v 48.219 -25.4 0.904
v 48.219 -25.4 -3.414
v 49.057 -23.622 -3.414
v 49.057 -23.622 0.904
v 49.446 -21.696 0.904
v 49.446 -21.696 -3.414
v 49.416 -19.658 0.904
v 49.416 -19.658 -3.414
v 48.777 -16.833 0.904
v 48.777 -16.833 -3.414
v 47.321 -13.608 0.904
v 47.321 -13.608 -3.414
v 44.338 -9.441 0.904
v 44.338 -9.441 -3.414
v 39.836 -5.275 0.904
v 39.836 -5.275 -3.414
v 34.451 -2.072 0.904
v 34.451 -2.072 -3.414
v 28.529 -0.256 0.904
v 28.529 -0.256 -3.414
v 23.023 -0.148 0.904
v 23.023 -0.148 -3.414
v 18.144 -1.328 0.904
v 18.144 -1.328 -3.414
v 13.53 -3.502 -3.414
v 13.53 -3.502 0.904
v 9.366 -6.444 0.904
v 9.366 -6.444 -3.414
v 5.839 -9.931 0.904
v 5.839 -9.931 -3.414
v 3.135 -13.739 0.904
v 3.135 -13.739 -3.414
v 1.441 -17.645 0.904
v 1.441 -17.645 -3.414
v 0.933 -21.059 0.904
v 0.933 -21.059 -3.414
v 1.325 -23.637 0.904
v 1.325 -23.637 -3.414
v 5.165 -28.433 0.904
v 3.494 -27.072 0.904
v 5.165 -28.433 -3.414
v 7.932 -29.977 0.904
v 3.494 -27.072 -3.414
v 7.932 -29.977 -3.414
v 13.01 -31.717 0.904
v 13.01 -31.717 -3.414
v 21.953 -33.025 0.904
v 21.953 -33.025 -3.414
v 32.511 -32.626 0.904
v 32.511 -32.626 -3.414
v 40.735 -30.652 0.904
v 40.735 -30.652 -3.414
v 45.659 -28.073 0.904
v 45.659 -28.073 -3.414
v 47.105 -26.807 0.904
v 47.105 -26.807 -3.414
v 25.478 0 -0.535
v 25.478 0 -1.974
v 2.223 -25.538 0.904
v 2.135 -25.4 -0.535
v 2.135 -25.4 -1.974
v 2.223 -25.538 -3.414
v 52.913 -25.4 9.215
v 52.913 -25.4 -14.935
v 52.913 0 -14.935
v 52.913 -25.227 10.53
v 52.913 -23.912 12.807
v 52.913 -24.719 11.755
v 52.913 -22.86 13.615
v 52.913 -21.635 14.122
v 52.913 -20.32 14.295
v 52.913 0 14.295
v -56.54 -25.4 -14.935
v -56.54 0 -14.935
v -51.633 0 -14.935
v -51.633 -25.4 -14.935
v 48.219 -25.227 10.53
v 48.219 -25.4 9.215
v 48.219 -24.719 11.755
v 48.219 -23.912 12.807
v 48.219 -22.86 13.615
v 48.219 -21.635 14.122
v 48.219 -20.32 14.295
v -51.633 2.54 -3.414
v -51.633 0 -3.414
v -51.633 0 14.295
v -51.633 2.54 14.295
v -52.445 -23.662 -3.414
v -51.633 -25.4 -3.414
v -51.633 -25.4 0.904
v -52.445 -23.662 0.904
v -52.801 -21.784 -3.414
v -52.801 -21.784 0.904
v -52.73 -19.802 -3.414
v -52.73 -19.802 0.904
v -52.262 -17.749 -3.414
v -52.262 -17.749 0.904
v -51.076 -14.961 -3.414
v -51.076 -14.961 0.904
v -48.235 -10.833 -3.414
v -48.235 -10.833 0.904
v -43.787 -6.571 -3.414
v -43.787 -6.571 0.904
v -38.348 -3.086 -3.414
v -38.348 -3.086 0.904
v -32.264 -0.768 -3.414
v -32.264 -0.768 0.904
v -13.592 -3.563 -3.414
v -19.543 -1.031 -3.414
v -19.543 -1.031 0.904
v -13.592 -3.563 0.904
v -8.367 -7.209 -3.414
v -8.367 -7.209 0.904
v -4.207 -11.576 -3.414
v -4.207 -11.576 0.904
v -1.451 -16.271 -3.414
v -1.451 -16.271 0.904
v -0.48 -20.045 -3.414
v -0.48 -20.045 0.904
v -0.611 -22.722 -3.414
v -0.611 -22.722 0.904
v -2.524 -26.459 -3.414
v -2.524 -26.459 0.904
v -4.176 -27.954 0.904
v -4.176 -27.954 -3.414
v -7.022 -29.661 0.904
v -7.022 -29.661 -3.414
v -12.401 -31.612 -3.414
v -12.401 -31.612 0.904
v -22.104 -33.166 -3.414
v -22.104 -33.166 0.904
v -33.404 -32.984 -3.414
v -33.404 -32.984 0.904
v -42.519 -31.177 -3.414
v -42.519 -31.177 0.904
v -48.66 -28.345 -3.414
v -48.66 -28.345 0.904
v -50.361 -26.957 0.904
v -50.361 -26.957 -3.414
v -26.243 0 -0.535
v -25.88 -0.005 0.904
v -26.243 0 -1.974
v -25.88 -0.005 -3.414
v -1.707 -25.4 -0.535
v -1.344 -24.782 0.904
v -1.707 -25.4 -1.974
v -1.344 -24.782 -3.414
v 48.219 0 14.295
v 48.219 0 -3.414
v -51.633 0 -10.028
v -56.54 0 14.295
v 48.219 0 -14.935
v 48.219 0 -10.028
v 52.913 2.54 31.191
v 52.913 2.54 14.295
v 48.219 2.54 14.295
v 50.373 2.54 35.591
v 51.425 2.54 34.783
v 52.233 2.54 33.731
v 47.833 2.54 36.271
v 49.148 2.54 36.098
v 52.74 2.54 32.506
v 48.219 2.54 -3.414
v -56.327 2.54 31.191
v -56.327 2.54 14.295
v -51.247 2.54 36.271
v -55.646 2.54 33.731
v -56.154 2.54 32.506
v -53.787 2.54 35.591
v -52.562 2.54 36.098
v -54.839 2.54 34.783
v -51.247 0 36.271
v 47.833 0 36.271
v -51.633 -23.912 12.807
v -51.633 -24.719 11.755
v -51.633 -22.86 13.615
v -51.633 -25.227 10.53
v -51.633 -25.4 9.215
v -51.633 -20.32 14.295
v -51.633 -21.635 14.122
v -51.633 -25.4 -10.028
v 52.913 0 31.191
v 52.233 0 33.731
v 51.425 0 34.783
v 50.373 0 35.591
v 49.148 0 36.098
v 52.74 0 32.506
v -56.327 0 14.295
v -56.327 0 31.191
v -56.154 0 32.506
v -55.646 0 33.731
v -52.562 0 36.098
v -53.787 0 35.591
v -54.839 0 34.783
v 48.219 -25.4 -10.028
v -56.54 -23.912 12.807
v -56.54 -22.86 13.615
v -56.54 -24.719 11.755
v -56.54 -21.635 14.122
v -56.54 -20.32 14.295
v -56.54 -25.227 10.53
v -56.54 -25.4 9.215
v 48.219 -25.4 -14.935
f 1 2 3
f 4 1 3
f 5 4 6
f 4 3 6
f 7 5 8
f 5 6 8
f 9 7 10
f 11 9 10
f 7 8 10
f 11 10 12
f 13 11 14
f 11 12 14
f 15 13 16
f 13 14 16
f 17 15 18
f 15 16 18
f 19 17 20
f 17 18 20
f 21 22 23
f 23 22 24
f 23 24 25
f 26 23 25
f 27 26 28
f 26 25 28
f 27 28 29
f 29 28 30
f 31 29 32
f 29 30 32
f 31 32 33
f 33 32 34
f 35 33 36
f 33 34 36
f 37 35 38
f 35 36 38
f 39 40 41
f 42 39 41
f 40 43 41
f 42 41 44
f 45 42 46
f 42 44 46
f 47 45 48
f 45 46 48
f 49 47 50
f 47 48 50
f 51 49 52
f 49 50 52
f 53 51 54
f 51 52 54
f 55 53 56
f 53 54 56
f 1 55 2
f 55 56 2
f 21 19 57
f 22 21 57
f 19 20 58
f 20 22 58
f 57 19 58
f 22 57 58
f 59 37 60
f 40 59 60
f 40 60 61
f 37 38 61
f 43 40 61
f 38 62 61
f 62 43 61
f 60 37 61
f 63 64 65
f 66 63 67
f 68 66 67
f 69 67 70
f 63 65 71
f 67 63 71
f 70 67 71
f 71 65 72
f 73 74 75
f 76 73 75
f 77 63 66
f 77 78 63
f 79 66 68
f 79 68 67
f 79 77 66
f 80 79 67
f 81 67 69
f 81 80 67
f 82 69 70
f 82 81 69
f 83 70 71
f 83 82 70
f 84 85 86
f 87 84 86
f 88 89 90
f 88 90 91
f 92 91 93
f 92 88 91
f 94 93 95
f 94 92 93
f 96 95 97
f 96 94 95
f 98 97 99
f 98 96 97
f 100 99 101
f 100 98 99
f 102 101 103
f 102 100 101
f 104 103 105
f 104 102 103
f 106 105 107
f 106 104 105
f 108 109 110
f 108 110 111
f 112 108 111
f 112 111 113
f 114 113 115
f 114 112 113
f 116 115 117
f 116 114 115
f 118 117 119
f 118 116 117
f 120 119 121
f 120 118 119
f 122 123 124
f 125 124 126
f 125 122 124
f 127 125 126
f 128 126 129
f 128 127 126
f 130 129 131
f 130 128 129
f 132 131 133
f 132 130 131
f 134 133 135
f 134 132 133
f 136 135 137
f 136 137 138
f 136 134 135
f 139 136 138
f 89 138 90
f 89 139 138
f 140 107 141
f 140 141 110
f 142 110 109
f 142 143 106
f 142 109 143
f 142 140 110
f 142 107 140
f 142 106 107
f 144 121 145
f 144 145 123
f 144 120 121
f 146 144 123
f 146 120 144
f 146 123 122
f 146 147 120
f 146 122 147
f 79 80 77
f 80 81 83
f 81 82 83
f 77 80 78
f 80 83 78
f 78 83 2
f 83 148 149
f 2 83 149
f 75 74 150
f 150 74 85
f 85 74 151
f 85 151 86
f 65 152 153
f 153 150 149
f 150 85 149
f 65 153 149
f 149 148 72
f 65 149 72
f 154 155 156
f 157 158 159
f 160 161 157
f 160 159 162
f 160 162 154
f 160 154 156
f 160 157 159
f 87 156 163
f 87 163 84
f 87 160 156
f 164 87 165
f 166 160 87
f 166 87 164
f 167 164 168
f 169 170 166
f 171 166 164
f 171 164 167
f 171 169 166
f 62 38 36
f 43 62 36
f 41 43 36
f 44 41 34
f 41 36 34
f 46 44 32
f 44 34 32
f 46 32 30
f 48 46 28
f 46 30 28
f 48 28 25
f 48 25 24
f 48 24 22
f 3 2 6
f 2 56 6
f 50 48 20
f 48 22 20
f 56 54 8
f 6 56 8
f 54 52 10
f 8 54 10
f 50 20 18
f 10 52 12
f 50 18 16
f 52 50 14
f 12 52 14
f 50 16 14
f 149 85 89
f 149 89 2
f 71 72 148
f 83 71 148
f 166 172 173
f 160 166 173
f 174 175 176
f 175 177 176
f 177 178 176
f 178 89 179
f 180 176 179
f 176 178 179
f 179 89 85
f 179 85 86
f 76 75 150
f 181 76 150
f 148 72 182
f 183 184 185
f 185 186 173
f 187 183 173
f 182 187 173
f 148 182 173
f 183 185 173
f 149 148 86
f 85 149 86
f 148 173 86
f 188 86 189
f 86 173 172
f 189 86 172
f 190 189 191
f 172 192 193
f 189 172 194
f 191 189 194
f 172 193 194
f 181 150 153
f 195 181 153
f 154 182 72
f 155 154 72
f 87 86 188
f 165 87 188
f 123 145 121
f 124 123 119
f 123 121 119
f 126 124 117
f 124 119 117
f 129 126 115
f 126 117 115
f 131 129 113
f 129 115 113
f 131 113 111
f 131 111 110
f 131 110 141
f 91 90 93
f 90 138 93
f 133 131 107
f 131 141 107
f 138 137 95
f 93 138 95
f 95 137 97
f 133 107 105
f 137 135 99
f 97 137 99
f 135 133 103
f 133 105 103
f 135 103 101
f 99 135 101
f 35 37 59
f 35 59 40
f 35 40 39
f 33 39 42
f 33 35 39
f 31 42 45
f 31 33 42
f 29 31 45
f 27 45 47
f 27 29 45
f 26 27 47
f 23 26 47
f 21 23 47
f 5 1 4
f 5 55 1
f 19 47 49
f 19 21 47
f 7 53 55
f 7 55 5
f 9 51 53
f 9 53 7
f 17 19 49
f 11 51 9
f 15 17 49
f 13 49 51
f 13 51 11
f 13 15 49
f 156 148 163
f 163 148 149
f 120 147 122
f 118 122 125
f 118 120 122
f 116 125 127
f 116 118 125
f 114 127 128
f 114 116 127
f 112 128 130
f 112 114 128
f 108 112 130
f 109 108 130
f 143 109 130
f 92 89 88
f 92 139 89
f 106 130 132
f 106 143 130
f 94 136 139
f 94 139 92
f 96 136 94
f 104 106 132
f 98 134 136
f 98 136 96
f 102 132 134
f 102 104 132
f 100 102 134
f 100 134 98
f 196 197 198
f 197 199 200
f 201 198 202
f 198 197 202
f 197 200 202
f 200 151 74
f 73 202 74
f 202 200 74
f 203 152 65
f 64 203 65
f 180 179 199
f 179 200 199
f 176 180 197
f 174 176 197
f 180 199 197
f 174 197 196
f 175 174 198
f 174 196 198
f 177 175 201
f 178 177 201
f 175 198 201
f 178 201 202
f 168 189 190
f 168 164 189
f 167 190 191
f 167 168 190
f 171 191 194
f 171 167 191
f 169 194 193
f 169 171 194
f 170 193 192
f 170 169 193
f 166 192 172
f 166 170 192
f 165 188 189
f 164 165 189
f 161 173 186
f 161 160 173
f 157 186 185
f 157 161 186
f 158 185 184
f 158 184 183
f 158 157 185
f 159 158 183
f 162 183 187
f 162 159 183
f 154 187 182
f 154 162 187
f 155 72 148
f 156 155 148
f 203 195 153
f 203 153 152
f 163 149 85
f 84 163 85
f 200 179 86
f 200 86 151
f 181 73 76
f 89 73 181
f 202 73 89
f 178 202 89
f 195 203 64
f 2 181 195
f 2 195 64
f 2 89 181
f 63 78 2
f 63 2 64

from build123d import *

# Parameters (mm, degrees)
F0_W      = 99.852476269
F0_H      = 6.614160724
F2_DEPTH  = 25.4
F5_DEPTH  = 2.54
F6_R      = 5.08
F7_R      = 5.08
F8_R      = 5.08
F9_R      = 5.08
F11_DEPTH = 4.318


with BuildPart() as f2:
    # F0 (on Front) → F2 (new body)
    with BuildSketch(Plane.XZ):
        Polygon((48.2193566859, -3.4137601033), (48.2193566859, -10.0279208273), (48.2193566859, -14.9352001026), (52.9132783413, -14.9352001026), (52.9132783413, 14.2951197922), (48.2193566859, 14.2951197922), align=None)
        with Locations((-1.7068814486, -6.7208404653)):
            Rectangle(F0_W, F0_H)
        Polygon((-51.6331195831, -14.9352001026), (-51.6331195831, -10.0279208273), (-51.6331195831, -3.4137601033), (-51.6331195831, 14.2951197922), (-56.5403997898, 14.2951197922), (-56.5403997898, -14.9352001026), align=None)
    extrude(amount=F2_DEPTH)

    # F8
    f8_edges = [f2.edges().sort_by_distance(p)[0] for p in [
        (-54.08676, -25.4, 14.29512),
    ]]
    fillet(f8_edges, radius=F8_R)

    # F9
    f9_edges = [f2.edges().sort_by_distance(p)[0] for p in [
        (50.566318, -25.4, 14.29512),
    ]]
    fillet(f9_edges, radius=F9_R)


with BuildPart() as f5:
    # F3 (on face) → F5 (new body)
    with BuildSketch(Plane(origin=(0, 0, 0), x_dir=(-1, 0, 0), z_dir=(0, 1, 0))):
        Polygon((-52.9132783413, 36.2712033093), (-52.9132783413, 14.2951197922), (-48.2193566859, 14.2951197922), (-48.2193566859, -3.4137601033), (51.6331195831, -3.4137601033), (51.6331195831, 14.2951197922), (56.3270449638, 14.2951197922), (56.3270449638, 36.2712033093), align=None)
    extrude(amount=F5_DEPTH)

    # F6
    f6_edges = [f5.edges().sort_by_distance(p)[0] for p in [
        (-56.327045, 1.27, 36.271203),
    ]]
    fillet(f6_edges, radius=F6_R)

    # F7
    f7_edges = [f5.edges().sort_by_distance(p)[0] for p in [
        (52.913278, 1.27, 36.271203),
    ]]
    fillet(f7_edges, radius=F7_R)


with BuildPart() as f11:
    # F10 (on face) → F11 (new body)
    with BuildSketch(Plane.XY.offset(-3.4137601033)):
        with BuildLine():
            add(Edge.make_bspline(
                [(-51.6331195831, -25.4), (-57.3096488035, -16.4456248773), (-26.1323176839, 16.4714129204), (21.9746192356, -36.0121761492), (-44.940188142, -35.957687007), (-51.6331195831, -25.4)],
                knots=[0, 0, 0, 0, 0.3153887328, 0.6281398221, 1, 1, 1, 1], degree=3))
        make_face()
    extrude(amount=F11_DEPTH)


with BuildPart() as f11b:
    # F10 (on face) → F11, piece 2 (new body)
    with BuildSketch(Plane.XY.offset(-3.4137601033)):
        with BuildLine():
            add(Edge.make_bspline(
                [(48.2193566859, -25.4), (53.8346501258, -16.544482979), (25.5659038487, 16.5274348203), (-20.1749106953, -35.6580634664), (41.6907986408, -35.6957677117), (48.2193566859, -25.4)],
                knots=[0, 0, 0, 0, 0.3156015553, 0.6330693854, 1, 1, 1, 1], degree=3))
        make_face()
    extrude(amount=F11_DEPTH)


solid = Compound([f2.part, f5.part, f11.part, f11b.part])
